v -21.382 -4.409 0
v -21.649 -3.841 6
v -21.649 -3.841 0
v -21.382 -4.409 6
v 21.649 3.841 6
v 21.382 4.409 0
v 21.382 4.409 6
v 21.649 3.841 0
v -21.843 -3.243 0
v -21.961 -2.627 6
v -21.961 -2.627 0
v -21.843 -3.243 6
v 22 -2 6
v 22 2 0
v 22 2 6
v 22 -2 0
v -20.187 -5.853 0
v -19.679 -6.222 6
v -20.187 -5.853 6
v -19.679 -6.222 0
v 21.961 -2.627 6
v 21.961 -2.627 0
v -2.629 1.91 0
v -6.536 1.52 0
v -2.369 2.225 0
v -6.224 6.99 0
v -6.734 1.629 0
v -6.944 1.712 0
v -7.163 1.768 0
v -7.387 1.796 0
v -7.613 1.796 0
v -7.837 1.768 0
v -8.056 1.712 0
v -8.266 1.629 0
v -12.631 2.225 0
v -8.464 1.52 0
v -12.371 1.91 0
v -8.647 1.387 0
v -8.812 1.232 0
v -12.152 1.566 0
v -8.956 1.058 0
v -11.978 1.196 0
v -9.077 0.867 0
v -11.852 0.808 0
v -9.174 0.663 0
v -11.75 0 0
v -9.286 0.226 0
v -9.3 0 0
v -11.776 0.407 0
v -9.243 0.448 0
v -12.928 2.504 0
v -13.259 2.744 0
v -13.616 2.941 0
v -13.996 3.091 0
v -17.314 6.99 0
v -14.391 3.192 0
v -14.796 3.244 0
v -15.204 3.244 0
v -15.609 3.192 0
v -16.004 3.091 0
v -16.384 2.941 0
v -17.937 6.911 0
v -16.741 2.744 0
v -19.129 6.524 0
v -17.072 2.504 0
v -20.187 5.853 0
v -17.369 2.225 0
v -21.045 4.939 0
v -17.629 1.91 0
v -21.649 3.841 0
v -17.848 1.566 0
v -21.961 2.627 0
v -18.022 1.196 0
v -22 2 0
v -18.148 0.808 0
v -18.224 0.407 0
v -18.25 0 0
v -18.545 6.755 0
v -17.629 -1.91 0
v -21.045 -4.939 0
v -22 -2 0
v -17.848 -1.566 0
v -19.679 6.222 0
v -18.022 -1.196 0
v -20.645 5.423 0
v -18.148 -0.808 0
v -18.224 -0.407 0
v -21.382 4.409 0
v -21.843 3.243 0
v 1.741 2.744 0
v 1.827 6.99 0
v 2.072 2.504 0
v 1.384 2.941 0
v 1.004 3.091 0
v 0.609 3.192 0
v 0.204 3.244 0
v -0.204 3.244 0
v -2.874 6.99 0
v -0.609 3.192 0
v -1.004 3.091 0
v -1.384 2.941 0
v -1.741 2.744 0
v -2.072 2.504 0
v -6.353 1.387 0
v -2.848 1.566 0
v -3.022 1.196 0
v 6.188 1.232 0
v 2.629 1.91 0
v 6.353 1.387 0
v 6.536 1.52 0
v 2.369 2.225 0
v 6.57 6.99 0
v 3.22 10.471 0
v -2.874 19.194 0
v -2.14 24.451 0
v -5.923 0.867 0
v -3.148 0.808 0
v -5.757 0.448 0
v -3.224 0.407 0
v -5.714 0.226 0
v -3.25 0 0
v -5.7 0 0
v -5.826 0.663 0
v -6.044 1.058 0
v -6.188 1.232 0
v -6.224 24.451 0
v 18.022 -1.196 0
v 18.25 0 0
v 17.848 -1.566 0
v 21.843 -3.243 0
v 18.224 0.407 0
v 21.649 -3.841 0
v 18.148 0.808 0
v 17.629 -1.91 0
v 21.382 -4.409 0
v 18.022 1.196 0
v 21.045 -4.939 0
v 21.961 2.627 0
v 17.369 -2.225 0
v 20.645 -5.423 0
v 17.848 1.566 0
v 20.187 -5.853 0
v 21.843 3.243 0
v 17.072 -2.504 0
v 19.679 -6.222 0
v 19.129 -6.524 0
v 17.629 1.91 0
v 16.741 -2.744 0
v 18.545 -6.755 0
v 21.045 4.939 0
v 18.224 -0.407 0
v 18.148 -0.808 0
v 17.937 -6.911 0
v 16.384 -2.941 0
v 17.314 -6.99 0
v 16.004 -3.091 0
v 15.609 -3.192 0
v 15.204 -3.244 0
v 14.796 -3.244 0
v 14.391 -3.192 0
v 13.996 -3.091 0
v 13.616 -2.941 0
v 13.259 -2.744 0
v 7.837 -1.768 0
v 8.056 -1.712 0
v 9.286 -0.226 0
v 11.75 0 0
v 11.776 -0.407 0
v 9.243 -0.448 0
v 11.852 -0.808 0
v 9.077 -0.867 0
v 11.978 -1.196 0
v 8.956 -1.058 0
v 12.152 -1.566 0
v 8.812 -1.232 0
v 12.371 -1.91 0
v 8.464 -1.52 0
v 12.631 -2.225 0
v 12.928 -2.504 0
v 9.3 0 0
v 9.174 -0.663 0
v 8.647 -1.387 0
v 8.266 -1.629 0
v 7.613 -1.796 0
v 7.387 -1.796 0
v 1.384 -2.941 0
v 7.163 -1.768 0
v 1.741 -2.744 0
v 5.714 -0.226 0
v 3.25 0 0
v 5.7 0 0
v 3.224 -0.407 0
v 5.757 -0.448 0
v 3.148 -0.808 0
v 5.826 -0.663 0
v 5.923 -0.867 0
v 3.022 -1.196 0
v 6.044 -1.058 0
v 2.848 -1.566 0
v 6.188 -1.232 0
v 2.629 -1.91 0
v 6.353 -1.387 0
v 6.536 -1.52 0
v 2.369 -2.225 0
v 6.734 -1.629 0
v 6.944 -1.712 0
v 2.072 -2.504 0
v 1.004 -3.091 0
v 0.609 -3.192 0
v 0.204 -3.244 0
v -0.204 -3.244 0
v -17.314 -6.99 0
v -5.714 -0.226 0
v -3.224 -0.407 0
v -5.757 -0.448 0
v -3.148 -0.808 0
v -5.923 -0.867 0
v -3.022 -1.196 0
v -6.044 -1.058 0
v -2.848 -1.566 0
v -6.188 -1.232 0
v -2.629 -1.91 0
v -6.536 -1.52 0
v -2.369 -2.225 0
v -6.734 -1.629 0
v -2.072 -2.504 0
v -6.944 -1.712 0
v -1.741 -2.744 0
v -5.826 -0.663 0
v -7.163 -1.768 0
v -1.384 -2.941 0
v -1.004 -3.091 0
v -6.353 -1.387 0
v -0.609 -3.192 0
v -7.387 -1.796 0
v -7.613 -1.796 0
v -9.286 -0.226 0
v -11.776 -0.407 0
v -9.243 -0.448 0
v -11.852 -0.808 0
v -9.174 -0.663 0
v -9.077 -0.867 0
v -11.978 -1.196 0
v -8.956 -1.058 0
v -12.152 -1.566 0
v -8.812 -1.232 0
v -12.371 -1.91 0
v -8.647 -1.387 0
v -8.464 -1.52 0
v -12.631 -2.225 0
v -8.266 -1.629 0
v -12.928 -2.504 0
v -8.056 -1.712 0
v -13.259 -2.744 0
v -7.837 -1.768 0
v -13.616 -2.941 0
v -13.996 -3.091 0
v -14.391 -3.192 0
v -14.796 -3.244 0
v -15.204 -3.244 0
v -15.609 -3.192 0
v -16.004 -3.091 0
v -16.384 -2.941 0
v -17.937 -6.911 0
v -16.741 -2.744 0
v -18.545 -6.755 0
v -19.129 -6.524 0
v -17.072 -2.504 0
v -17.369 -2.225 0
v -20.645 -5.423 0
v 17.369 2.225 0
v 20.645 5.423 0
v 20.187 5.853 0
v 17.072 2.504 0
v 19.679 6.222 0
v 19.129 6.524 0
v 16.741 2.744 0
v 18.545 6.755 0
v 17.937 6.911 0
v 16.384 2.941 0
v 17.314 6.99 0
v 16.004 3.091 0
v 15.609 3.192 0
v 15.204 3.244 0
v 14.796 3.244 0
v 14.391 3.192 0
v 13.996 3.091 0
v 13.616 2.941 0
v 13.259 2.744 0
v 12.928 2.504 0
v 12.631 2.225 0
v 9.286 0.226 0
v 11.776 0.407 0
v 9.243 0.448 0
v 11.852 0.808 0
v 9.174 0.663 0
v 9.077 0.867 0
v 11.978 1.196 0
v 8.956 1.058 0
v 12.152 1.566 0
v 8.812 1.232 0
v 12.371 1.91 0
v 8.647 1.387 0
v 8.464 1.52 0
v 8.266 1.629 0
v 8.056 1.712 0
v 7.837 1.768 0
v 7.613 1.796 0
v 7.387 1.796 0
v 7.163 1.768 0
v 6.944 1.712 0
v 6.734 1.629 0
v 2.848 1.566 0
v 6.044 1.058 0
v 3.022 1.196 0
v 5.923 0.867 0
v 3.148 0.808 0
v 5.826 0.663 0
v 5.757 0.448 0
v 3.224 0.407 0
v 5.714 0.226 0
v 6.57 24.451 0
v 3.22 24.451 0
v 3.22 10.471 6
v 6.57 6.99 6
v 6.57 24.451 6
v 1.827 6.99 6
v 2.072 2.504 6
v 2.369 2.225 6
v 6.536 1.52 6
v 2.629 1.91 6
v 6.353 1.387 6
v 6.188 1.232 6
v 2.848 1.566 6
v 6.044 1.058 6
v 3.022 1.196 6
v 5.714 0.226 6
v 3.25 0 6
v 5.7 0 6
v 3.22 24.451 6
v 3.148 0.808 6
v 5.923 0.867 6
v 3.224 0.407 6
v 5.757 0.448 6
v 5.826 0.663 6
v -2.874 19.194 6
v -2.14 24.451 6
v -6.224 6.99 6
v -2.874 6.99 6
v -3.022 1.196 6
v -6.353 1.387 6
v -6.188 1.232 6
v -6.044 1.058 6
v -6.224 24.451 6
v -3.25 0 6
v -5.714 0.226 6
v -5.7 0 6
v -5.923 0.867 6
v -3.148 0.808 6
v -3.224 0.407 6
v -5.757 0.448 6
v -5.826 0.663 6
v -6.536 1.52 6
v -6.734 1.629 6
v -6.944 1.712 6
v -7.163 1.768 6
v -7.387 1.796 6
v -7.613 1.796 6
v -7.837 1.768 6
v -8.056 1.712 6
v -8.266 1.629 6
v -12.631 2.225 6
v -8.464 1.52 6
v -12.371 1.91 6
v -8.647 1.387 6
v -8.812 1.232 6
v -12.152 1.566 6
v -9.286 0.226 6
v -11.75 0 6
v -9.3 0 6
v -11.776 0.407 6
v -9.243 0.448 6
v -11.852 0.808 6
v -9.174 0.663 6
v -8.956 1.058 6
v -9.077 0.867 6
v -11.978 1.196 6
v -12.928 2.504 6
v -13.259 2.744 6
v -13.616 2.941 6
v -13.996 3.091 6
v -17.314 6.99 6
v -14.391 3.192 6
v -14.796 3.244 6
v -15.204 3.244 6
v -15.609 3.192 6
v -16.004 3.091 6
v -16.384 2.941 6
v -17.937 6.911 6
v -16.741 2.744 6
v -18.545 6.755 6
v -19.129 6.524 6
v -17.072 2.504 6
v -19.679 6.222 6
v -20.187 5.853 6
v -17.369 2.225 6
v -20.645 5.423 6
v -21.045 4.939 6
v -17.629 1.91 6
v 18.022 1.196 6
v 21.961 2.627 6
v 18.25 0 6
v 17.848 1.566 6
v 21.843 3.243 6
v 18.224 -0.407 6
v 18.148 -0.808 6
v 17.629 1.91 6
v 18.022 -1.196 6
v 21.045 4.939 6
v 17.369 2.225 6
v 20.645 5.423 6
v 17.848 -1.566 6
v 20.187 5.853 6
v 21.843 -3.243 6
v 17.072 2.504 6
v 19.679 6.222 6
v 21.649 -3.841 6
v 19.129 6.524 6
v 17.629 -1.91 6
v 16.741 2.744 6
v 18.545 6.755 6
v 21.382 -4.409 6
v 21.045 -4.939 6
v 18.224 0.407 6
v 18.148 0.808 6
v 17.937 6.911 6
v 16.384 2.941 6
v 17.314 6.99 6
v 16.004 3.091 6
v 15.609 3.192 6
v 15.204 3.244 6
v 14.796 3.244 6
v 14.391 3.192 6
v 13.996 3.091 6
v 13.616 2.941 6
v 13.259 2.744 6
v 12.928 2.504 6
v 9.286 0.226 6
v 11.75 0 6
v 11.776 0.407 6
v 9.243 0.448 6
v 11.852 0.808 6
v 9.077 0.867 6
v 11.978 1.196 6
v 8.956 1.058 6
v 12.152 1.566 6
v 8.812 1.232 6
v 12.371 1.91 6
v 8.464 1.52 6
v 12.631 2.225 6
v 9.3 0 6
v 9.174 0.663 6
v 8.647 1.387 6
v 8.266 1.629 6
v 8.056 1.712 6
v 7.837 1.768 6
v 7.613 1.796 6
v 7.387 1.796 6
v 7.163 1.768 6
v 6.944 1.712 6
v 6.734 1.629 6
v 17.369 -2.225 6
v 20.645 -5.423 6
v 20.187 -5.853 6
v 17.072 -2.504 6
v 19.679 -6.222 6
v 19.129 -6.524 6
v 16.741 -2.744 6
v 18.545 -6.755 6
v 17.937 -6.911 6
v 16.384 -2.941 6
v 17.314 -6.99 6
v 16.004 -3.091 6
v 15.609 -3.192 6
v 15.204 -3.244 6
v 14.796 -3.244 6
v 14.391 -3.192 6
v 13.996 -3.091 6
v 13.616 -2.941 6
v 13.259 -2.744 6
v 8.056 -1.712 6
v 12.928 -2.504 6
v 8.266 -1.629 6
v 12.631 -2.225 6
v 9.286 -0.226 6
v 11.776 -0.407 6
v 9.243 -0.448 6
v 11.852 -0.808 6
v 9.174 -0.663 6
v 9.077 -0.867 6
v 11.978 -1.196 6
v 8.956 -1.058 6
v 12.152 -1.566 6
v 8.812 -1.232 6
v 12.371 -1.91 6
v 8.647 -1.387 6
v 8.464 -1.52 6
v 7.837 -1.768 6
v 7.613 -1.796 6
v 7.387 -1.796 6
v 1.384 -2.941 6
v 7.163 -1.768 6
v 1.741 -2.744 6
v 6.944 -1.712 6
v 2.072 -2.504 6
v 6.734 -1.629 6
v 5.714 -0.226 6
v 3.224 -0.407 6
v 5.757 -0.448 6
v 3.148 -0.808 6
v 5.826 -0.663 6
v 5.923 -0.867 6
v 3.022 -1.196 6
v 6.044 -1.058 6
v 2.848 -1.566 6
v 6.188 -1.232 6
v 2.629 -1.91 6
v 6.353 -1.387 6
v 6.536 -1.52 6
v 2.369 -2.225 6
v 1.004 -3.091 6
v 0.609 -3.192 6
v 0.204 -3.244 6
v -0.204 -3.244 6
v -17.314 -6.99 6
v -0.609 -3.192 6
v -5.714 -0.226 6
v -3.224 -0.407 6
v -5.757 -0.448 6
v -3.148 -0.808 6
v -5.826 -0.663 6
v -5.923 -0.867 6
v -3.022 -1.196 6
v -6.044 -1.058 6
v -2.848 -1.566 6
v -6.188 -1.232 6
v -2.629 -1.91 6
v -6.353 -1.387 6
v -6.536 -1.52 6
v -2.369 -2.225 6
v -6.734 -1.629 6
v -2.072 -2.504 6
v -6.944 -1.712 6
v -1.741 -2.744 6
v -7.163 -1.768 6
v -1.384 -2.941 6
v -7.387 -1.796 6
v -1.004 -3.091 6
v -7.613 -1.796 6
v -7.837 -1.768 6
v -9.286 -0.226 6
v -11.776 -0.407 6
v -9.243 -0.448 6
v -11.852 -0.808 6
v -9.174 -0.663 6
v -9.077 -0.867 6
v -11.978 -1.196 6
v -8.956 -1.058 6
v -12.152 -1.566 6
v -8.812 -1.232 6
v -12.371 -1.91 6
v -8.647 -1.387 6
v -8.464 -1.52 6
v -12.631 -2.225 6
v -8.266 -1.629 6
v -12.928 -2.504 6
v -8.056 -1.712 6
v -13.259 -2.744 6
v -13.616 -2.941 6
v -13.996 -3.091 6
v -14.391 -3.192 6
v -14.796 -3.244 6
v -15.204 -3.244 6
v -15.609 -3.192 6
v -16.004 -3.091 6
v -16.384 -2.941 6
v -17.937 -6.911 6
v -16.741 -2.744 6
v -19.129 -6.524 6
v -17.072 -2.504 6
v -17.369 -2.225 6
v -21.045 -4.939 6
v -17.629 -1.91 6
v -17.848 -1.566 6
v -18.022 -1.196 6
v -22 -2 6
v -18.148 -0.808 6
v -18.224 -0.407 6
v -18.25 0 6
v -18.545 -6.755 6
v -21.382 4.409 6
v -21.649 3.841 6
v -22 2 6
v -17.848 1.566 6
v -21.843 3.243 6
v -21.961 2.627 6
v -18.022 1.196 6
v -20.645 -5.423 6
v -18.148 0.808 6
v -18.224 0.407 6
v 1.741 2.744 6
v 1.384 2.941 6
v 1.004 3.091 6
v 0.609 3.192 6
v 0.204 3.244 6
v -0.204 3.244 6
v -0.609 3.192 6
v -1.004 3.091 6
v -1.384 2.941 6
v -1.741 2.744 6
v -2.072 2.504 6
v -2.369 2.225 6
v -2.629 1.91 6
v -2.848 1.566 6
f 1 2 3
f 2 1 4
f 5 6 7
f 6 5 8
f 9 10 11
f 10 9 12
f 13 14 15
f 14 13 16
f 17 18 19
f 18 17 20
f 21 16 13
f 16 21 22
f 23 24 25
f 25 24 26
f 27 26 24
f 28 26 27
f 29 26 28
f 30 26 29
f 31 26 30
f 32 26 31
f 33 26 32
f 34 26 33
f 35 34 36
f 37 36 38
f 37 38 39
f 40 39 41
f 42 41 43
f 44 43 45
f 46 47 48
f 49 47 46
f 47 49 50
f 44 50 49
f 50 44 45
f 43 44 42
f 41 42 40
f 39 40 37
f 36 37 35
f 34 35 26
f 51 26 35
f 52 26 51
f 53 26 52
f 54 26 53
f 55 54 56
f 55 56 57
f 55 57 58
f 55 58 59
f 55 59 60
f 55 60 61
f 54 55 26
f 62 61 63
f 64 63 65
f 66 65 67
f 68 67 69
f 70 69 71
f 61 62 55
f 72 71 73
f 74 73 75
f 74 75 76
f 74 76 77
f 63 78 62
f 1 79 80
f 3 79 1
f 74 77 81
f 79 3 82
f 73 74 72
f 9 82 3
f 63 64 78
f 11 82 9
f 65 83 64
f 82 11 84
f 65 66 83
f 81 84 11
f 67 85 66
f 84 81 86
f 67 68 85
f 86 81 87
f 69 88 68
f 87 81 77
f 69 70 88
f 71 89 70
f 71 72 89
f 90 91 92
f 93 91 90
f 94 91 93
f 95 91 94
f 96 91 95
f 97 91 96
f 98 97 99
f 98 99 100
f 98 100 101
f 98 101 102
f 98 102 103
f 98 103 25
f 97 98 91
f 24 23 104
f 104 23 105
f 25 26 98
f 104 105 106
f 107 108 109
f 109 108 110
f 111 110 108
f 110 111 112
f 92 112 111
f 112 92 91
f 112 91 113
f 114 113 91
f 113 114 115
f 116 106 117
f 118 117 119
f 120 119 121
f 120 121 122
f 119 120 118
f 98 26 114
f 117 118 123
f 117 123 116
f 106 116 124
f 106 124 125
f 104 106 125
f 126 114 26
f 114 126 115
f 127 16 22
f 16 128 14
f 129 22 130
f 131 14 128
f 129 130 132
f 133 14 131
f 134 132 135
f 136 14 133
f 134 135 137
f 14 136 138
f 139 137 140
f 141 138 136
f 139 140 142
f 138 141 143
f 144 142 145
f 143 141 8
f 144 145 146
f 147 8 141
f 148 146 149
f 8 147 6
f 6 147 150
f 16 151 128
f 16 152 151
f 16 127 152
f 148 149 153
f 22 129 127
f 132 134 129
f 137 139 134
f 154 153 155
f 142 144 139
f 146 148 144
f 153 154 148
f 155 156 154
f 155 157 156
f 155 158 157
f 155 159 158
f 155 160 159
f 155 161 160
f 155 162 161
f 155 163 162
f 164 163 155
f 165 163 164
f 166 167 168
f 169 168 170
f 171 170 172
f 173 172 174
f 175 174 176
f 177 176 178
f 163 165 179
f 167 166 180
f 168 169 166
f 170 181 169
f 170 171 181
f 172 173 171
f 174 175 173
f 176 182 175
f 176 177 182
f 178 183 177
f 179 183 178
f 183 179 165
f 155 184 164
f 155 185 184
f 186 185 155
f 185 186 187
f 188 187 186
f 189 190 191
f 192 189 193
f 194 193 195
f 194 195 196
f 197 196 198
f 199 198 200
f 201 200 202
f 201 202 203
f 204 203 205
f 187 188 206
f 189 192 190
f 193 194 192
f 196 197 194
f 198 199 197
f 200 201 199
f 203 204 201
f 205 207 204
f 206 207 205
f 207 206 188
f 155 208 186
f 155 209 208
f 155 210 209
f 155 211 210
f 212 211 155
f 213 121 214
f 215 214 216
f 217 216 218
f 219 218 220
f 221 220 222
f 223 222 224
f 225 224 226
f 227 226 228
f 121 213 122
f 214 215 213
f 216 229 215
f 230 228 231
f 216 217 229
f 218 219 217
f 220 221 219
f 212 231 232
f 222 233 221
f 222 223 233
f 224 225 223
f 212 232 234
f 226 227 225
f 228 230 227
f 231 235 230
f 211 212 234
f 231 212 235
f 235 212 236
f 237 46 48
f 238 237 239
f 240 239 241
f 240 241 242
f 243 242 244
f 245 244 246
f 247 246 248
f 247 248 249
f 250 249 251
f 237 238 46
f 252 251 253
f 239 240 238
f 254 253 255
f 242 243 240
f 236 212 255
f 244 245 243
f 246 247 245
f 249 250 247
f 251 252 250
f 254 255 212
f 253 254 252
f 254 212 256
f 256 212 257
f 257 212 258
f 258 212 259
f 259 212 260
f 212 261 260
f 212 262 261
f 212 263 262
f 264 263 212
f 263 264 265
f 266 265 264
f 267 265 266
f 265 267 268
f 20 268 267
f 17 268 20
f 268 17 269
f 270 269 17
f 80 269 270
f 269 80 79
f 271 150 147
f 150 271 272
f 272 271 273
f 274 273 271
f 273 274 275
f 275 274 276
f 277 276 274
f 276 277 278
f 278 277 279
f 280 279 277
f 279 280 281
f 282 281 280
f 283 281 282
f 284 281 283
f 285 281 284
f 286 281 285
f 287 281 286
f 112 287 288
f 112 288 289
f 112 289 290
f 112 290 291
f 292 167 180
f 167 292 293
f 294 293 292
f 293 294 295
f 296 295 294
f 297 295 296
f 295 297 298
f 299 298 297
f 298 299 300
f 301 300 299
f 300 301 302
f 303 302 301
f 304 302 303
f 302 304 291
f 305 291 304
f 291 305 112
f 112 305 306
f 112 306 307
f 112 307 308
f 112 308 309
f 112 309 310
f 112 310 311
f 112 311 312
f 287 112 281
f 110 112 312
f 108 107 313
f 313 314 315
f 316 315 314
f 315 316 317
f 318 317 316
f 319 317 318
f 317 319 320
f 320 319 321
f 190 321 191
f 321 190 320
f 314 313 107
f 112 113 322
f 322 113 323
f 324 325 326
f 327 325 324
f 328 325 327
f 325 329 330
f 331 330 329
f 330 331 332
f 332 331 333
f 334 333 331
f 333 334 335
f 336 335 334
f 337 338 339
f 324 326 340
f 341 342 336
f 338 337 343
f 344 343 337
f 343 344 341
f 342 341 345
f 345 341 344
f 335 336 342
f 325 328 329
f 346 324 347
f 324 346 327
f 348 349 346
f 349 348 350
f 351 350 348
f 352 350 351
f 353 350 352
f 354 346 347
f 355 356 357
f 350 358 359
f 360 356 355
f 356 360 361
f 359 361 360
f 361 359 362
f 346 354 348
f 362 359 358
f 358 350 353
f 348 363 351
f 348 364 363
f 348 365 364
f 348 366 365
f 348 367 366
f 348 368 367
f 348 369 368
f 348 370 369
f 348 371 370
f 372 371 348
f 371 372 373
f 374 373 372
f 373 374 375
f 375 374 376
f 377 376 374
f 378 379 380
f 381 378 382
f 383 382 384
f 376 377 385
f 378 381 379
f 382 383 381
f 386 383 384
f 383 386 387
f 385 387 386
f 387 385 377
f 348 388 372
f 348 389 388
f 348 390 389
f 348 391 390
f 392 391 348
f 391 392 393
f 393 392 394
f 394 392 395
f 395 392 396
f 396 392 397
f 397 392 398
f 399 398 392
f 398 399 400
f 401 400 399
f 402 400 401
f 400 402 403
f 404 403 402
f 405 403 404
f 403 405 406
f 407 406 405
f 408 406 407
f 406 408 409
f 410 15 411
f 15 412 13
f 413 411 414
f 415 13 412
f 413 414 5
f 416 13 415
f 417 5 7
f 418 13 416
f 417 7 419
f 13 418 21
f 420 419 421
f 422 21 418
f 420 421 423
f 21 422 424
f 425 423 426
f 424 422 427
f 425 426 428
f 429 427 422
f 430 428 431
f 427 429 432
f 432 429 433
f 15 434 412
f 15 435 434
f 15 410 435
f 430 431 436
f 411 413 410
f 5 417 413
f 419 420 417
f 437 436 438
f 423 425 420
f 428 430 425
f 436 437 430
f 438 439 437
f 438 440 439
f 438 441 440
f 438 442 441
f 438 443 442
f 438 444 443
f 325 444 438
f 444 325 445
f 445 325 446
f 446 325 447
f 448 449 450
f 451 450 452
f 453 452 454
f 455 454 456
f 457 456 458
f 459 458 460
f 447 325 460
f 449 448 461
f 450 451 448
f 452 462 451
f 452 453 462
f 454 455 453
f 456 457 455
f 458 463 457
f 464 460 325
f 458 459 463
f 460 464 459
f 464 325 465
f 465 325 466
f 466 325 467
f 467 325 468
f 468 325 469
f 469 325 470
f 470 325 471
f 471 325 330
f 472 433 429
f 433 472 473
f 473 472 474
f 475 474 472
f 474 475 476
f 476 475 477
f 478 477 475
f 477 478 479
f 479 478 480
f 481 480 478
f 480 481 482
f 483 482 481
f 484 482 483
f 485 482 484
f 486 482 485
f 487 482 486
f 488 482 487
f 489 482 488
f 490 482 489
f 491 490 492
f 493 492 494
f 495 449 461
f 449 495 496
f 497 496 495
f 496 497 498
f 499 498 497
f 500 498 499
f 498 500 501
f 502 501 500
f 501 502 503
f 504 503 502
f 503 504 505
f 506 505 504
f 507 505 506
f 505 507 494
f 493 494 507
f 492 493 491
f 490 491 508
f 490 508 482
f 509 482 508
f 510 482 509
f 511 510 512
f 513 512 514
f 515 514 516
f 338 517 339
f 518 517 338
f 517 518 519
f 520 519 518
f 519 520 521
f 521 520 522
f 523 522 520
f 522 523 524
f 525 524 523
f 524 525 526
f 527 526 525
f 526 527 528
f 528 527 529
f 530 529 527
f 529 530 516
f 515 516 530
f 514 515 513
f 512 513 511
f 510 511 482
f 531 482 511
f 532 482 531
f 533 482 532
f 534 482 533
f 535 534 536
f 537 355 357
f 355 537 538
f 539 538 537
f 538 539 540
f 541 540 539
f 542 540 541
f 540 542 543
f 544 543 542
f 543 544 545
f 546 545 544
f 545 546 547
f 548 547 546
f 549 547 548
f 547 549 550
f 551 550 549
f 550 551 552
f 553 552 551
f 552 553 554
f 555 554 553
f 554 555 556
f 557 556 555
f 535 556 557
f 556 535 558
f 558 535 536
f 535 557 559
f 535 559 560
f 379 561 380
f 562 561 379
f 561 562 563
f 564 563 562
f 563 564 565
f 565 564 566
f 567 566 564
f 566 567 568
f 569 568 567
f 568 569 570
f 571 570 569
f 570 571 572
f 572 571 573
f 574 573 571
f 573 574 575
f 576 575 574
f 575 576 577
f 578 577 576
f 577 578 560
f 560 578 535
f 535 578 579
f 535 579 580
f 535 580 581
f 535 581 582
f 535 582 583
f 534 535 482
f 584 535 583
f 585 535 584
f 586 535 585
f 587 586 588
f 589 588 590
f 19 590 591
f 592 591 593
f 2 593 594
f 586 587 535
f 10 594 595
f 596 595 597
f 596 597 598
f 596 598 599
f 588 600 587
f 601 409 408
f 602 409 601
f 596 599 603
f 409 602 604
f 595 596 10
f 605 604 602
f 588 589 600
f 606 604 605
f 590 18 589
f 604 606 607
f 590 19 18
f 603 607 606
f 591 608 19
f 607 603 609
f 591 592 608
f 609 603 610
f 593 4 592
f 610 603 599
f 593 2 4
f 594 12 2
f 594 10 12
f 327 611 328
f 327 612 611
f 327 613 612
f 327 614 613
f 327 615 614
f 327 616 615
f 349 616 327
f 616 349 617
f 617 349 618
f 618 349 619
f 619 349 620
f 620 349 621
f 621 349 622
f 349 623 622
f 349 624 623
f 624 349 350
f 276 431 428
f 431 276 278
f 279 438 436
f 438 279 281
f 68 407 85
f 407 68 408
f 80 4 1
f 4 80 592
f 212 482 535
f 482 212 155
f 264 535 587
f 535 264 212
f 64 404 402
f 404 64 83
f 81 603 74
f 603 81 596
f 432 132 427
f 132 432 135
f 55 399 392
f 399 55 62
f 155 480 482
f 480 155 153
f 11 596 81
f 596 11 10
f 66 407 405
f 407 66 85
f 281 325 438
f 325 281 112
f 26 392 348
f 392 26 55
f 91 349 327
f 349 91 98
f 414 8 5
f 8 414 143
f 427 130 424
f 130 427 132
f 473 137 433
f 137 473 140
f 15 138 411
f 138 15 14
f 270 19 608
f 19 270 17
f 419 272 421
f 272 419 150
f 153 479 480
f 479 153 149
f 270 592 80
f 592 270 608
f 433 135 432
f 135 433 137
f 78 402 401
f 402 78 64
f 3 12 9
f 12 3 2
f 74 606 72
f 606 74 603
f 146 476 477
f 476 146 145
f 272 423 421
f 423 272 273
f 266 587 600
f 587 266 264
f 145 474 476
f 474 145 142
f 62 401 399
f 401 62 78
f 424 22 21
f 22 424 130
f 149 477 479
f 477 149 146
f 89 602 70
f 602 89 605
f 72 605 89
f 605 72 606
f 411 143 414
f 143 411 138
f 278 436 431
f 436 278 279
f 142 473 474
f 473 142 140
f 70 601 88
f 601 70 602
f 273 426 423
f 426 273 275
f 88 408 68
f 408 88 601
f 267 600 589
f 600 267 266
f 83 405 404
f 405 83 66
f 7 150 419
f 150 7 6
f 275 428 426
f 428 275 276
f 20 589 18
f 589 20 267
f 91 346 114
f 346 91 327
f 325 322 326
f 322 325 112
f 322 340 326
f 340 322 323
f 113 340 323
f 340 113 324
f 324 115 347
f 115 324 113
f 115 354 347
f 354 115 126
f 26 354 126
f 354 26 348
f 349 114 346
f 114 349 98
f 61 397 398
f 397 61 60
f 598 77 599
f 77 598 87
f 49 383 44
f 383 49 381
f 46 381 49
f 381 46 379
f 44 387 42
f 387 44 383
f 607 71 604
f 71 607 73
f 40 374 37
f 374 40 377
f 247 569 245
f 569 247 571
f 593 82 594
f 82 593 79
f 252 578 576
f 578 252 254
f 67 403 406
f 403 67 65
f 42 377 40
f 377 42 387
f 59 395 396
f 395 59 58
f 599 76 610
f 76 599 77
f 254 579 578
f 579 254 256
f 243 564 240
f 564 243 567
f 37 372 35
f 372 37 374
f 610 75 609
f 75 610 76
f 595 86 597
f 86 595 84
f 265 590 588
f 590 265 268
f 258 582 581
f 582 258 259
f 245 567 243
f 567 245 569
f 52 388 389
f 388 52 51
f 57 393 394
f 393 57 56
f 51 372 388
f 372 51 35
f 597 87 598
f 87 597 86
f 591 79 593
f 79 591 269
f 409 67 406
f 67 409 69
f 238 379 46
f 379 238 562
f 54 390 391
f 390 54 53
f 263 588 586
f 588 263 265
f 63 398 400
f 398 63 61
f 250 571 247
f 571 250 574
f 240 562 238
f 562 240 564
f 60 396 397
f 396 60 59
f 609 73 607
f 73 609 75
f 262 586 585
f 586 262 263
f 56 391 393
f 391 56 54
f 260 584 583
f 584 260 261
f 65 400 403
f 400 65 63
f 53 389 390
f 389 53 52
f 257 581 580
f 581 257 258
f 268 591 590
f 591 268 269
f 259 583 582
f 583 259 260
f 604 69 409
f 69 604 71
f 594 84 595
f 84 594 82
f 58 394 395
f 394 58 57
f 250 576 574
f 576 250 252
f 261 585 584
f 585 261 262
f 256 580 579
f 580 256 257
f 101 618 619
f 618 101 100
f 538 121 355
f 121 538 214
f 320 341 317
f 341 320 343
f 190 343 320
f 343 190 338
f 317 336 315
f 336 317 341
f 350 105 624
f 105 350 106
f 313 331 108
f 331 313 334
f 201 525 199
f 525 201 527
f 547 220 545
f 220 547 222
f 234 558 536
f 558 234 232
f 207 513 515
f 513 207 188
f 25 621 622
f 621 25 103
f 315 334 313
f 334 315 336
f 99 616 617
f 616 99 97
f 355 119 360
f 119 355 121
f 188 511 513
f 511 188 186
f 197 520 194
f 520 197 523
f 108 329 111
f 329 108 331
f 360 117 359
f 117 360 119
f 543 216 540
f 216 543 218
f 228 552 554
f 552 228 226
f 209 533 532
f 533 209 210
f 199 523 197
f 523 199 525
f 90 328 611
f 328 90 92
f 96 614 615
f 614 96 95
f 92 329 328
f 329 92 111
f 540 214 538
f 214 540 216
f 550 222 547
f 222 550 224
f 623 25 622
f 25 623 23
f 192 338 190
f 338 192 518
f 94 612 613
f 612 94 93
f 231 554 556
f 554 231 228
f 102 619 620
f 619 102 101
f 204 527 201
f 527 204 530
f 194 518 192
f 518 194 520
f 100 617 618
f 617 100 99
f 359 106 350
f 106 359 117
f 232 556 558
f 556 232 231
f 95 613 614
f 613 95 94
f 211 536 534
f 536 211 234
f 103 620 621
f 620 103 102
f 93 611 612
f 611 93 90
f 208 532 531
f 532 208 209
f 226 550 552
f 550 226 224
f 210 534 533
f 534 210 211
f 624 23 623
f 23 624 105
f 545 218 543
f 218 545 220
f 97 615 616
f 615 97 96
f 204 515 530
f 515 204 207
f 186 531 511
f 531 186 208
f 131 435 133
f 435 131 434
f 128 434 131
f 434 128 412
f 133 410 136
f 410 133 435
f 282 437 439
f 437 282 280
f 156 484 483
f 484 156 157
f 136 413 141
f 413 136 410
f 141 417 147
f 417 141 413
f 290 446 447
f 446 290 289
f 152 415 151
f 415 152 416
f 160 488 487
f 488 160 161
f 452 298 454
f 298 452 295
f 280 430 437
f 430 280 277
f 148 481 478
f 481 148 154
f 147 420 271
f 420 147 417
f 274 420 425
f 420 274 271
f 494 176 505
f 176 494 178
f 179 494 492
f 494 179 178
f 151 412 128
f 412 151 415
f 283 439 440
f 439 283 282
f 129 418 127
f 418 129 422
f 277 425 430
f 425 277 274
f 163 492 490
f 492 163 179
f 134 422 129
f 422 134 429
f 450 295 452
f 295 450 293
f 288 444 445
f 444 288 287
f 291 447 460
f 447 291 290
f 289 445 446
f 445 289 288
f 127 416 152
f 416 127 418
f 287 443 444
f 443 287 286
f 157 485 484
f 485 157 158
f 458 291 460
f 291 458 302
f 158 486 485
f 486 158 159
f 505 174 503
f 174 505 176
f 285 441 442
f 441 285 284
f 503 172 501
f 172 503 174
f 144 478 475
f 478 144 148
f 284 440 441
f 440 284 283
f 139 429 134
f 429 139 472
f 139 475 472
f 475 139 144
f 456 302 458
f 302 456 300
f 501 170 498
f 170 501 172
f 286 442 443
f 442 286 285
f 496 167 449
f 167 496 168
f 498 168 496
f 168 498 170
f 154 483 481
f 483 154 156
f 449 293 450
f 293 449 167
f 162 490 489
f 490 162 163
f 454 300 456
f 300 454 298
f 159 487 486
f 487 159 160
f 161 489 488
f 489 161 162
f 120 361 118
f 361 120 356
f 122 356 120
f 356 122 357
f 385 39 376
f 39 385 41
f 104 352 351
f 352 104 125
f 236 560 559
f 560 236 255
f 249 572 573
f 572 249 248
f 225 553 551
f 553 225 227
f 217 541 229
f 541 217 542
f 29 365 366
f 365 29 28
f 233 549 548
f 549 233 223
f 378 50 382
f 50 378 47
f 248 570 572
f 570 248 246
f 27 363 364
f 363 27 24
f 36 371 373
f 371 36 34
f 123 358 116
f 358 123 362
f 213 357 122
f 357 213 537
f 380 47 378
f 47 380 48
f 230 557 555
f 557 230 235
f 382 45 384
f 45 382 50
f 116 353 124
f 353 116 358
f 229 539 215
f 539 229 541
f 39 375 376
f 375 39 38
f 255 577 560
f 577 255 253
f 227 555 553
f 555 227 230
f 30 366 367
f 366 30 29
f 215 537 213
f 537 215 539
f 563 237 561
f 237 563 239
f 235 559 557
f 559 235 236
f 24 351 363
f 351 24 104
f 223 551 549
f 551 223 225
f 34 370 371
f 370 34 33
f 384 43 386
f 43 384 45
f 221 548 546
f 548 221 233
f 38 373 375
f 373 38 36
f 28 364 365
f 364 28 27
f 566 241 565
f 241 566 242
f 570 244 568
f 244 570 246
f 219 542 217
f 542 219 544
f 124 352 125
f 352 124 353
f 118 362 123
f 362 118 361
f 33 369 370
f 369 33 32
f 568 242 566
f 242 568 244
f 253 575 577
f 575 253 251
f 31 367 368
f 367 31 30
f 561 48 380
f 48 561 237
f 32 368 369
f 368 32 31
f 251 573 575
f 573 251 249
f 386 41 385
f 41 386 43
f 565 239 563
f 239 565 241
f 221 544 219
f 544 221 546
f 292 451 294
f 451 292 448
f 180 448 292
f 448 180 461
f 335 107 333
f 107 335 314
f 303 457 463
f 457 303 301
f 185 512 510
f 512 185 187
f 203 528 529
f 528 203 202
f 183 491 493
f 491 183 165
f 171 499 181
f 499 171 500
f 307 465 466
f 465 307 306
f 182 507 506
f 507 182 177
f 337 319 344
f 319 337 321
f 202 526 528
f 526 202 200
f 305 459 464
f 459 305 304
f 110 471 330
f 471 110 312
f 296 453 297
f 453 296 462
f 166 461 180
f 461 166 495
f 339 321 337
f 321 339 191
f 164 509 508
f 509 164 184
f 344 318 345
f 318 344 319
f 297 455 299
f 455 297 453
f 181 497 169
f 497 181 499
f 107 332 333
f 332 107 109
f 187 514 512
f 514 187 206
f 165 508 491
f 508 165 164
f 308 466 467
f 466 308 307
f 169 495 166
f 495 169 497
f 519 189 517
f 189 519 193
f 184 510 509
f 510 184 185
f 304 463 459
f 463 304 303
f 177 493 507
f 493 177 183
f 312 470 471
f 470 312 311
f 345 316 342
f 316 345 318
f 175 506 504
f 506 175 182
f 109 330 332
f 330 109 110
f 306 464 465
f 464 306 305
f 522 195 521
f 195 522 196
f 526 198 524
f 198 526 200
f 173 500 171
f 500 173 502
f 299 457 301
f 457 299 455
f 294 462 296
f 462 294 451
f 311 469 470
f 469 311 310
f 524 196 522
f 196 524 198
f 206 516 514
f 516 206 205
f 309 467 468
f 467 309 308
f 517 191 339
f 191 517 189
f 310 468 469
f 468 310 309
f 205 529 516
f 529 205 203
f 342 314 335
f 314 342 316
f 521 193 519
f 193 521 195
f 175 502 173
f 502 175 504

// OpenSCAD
$fn = 50;


difference() {
	union() {
		hull() {
			translate(v = [-17.0000000000, 2.0000000000, 0]) {
				cylinder(h = 6, r = 5);
			}
			translate(v = [17.0000000000, 2.0000000000, 0]) {
				cylinder(h = 6, r = 5);
			}
			translate(v = [-17.0000000000, -2.0000000000, 0]) {
				cylinder(h = 6, r = 5);
			}
			translate(v = [17.0000000000, -2.0000000000, 0]) {
				cylinder(h = 6, r = 5);
			}
		}
		translate(v = [0, 24, 0]) {
			linear_extrude(height = 6) {
				text(font = "DejaVu Sans Mono:style=Bold", halign = "center", size = 19.0000000000, text = "N", valign = "top");
			}
		}
	}
	union() {
		translate(v = [-15.0000000000, 0.0000000000, 0]) {
			translate(v = [0, 0, -100]) {
				cylinder(h = 200, r = 3.2500000000);
			}
		}
		translate(v = [0, 0, -100]) {
			cylinder(h = 200, r = 3.2500000000);
		}
		translate(v = [15.0000000000, 0.0000000000, 0]) {
			translate(v = [0, 0, -100]) {
				cylinder(h = 200, r = 3.2500000000);
			}
		}
		translate(v = [-15.0000000000, 0.0000000000, 0]) {
			translate(v = [0, 0, -100]) {
				cylinder(h = 200, r = 1.8000000000);
			}
		}
		translate(v = [-7.5000000000, 0.0000000000, 0]) {
			translate(v = [0, 0, -100]) {
				cylinder(h = 200, r = 1.8000000000);
			}
		}
		translate(v = [0, 0, -100]) {
			cylinder(h = 200, r = 1.8000000000);
		}
		translate(v = [7.5000000000, 0.0000000000, 0]) {
			translate(v = [0, 0, -100]) {
				cylinder(h = 200, r = 1.8000000000);
			}
		}
		translate(v = [15.0000000000, 0.0000000000, 0]) {
			translate(v = [0, 0, -100]) {
				cylinder(h = 200, r = 1.8000000000);
			}
		}
	}
}
